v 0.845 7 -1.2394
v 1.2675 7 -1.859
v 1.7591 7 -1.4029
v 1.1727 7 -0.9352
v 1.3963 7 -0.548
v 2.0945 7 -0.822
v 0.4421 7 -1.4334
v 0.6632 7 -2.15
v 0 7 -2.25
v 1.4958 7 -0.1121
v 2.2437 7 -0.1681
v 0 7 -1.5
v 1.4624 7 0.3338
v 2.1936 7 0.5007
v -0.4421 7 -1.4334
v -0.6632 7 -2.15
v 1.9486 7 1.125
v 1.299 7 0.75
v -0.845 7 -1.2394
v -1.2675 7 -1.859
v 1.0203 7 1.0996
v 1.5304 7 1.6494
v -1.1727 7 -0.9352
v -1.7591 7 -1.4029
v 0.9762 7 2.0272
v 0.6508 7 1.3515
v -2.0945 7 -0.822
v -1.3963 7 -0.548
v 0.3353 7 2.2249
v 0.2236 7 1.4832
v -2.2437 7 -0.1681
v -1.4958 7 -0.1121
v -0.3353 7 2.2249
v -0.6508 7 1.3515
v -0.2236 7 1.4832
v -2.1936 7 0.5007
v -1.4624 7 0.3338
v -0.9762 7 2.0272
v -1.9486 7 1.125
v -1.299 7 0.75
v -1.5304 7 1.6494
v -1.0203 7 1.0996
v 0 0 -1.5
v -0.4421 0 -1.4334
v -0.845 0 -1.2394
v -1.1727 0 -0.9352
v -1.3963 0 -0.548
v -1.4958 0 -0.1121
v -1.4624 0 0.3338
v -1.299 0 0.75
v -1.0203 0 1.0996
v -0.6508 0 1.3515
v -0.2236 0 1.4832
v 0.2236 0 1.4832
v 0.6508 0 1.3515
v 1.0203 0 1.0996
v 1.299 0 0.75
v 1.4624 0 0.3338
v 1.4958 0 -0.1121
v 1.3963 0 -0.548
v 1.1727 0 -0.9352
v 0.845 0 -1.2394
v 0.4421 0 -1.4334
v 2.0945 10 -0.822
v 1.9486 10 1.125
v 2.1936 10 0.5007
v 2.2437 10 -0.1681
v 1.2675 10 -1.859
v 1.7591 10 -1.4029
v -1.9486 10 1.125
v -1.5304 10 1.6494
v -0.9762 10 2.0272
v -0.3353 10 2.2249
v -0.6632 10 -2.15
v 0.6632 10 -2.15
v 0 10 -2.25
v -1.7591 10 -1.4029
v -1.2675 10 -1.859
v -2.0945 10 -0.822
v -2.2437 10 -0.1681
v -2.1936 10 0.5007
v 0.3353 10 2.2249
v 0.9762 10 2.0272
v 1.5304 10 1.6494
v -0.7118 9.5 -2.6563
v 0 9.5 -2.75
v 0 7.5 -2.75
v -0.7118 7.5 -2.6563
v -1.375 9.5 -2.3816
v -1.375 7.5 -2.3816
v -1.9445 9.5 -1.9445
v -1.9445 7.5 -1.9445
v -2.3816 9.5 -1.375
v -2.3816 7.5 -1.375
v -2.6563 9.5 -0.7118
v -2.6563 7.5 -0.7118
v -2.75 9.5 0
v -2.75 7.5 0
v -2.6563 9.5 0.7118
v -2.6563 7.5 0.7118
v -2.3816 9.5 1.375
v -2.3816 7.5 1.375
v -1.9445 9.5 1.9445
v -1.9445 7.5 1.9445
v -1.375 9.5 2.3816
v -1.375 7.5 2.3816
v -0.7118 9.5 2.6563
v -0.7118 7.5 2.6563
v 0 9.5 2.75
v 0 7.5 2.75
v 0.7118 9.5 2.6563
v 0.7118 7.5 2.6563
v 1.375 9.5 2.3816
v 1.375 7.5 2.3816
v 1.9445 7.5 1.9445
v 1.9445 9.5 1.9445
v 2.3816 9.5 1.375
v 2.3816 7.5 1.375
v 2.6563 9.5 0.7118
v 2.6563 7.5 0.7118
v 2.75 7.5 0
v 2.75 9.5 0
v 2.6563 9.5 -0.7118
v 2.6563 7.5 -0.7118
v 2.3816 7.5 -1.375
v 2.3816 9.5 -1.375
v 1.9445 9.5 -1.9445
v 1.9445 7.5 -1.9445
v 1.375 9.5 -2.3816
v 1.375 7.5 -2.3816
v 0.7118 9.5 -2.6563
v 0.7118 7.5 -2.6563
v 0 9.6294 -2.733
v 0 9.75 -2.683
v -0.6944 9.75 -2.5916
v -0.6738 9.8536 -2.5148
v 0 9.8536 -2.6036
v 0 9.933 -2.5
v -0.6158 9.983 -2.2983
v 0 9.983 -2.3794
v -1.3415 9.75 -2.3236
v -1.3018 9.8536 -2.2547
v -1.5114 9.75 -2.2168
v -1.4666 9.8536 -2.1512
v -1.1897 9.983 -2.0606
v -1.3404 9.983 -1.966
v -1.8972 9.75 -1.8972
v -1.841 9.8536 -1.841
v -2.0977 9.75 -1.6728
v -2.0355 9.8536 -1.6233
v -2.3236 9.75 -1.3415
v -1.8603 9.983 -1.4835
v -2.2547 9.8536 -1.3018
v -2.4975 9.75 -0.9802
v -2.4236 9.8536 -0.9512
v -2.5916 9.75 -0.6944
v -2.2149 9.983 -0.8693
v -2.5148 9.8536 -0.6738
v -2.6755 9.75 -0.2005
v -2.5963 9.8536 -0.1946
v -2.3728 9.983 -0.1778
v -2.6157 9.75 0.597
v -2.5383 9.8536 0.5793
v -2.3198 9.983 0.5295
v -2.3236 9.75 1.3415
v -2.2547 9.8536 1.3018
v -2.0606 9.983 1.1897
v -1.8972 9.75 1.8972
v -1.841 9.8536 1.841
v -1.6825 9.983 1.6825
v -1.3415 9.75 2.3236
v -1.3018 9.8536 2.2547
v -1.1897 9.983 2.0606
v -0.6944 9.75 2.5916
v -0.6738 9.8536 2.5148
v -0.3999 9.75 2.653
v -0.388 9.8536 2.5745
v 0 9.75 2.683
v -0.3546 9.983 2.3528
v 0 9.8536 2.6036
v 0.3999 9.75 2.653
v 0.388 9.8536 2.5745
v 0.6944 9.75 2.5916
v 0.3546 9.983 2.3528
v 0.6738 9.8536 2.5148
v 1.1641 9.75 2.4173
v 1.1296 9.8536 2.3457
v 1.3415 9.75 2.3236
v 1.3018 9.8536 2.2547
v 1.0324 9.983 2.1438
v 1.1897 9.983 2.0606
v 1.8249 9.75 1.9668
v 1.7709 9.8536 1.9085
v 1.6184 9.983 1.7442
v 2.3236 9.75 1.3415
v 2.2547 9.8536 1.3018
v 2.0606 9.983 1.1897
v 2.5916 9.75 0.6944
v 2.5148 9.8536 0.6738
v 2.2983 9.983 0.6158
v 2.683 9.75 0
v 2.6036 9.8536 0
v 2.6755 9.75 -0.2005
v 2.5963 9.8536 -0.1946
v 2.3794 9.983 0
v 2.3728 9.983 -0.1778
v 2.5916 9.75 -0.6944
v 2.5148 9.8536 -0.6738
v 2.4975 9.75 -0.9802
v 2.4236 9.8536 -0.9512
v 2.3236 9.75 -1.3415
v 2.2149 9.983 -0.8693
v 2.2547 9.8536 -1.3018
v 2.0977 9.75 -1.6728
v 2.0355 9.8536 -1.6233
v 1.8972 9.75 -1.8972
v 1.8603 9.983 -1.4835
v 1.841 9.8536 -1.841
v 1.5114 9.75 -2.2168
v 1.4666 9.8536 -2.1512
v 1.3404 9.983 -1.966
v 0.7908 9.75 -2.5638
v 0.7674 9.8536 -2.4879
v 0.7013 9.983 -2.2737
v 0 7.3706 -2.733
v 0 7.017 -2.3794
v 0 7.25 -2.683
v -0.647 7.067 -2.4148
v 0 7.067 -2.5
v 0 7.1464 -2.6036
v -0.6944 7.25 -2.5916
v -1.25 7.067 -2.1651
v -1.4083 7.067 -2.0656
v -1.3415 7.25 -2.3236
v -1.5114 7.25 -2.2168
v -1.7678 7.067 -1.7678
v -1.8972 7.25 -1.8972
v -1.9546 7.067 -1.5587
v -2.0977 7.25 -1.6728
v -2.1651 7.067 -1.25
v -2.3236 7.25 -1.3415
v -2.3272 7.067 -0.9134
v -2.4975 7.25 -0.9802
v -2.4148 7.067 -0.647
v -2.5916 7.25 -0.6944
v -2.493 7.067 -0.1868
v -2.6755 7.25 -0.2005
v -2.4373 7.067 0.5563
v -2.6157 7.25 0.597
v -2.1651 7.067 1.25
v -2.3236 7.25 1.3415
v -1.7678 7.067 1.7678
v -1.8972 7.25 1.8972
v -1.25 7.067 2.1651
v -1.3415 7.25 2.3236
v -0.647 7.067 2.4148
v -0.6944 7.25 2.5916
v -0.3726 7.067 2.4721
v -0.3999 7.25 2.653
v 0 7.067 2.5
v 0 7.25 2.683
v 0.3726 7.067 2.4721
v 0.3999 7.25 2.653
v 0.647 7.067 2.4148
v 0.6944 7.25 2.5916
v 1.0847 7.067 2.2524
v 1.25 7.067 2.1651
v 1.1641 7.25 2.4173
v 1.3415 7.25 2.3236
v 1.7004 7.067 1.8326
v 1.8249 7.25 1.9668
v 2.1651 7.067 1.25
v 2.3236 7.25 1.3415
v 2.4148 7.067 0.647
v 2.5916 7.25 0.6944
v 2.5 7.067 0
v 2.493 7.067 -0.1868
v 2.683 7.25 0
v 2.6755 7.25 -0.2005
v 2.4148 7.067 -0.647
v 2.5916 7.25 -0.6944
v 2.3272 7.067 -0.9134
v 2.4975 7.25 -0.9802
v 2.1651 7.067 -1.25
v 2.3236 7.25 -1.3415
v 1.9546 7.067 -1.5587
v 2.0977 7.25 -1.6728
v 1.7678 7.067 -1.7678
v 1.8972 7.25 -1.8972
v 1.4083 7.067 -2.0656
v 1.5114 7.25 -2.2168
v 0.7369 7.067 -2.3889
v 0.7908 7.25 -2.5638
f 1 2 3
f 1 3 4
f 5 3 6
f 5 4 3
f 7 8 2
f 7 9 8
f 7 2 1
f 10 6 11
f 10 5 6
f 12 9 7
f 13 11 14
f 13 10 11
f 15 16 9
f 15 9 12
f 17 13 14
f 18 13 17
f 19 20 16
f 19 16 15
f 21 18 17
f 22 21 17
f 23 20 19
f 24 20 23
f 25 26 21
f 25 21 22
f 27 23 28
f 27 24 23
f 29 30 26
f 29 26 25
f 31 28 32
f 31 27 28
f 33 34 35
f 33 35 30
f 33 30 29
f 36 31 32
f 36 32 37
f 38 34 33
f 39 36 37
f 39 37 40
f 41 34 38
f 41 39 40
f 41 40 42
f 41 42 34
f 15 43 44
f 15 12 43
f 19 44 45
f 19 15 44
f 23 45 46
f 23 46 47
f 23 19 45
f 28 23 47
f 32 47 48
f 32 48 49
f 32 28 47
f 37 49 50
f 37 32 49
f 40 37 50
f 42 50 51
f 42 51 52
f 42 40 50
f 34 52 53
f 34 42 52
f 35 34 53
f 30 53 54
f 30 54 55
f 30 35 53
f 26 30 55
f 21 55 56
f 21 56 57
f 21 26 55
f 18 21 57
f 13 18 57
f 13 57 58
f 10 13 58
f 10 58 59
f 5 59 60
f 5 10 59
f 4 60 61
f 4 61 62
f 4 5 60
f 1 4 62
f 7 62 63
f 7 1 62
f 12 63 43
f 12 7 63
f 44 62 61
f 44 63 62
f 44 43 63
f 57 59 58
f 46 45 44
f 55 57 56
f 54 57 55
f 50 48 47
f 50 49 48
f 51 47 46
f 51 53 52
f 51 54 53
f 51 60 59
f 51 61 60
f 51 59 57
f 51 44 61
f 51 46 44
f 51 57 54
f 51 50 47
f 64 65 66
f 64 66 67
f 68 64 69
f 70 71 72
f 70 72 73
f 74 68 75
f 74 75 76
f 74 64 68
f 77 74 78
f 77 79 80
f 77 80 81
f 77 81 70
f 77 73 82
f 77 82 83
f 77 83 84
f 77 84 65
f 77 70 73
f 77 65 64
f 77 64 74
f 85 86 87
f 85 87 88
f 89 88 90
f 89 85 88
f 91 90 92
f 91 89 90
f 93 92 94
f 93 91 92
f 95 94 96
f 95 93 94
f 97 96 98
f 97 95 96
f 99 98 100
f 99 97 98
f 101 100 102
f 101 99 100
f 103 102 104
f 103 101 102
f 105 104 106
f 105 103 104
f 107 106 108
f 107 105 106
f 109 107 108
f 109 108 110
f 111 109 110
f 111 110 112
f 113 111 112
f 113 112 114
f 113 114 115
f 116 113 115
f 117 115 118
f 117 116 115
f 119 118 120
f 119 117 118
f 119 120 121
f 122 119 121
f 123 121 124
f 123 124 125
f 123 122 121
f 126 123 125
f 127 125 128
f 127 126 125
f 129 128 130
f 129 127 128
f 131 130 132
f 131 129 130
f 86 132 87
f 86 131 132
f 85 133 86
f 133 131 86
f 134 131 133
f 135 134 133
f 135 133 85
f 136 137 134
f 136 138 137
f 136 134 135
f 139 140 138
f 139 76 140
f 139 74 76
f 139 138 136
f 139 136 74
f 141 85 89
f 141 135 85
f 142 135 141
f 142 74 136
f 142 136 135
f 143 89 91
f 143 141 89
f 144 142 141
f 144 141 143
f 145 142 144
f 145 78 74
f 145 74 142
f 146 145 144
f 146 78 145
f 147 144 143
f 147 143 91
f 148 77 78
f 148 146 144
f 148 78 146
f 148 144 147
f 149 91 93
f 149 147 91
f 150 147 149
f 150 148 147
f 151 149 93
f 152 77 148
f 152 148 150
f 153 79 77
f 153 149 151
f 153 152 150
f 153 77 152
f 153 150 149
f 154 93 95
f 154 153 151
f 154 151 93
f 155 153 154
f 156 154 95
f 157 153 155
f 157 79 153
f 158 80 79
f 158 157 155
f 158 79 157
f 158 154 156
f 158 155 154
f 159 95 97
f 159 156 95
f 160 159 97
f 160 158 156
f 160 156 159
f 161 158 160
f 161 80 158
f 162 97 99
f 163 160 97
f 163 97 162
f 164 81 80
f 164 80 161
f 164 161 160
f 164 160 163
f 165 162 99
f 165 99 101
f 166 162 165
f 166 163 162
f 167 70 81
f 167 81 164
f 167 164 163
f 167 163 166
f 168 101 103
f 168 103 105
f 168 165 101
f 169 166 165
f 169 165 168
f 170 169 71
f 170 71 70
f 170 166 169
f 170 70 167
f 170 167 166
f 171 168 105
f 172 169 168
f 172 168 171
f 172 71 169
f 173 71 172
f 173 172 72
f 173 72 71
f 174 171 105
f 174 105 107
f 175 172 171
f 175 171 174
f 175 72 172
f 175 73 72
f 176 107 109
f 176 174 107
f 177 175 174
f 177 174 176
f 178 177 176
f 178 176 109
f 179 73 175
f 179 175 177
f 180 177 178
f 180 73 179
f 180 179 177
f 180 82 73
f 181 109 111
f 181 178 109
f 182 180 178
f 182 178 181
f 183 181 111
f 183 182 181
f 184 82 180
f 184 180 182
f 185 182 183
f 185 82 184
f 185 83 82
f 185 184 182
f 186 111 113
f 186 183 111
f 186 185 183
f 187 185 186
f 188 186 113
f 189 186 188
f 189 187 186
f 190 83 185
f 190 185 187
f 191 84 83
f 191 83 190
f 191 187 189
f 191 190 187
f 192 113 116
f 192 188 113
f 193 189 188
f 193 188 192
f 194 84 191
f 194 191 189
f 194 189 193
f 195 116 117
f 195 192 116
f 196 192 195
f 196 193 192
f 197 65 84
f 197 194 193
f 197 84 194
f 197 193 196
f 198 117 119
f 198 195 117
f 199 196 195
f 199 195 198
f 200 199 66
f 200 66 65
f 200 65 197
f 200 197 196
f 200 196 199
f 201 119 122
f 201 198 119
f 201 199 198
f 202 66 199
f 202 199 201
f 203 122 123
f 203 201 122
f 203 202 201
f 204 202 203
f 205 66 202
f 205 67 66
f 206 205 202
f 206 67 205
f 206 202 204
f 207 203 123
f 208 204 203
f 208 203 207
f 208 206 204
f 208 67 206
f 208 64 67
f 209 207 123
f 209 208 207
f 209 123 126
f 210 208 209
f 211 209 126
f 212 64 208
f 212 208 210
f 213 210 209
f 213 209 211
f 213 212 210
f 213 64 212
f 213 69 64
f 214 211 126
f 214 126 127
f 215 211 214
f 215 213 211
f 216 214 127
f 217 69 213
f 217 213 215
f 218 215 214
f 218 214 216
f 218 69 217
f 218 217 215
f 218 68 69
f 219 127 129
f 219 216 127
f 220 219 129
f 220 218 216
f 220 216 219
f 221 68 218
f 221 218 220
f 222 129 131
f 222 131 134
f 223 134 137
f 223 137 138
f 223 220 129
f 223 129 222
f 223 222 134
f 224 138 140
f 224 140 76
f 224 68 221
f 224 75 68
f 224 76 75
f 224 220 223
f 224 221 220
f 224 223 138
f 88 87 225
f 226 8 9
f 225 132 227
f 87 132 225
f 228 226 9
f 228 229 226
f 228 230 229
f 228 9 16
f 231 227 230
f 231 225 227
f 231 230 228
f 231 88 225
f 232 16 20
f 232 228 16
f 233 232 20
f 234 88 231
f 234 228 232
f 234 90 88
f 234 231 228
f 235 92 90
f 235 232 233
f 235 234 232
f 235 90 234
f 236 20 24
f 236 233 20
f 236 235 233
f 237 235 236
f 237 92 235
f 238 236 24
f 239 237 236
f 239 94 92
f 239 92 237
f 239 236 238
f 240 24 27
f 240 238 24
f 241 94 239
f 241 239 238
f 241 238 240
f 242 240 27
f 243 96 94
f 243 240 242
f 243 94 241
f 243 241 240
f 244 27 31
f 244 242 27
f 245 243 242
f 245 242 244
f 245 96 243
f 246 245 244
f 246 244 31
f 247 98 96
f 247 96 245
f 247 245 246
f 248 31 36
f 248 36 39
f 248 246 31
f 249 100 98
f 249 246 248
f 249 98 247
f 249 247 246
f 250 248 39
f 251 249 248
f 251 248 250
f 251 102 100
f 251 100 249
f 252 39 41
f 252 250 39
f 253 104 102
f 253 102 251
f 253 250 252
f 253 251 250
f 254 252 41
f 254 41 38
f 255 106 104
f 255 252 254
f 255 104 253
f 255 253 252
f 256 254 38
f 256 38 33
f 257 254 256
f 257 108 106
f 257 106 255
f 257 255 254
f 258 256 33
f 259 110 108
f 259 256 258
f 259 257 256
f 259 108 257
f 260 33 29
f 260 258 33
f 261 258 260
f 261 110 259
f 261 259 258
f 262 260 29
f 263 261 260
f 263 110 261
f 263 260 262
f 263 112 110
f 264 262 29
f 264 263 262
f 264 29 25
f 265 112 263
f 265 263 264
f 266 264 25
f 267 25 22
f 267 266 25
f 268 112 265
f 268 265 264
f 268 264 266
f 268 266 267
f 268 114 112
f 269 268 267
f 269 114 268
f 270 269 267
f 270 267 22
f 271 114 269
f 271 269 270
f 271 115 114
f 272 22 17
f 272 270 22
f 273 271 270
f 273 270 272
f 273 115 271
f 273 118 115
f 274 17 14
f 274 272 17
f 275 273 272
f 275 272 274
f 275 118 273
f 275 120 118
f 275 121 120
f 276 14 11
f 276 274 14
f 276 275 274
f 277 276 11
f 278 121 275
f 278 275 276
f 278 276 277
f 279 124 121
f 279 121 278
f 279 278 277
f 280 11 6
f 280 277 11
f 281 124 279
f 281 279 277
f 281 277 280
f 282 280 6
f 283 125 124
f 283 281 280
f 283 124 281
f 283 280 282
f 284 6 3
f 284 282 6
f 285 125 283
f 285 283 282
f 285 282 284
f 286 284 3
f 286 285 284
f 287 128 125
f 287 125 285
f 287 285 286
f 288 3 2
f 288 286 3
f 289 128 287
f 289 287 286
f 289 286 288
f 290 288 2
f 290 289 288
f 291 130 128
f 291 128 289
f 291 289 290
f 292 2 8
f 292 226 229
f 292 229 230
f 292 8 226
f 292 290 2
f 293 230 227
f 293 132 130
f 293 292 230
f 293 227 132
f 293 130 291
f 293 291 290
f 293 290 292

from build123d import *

# Parameters (mm, degrees)
FILLET1_R = 0.5


with BuildPart() as part:
    # Sketch1 → Revolve1 (revolve)
    with BuildSketch(Plane.XY, mode=Mode.PRIVATE) as revolve1_sk:
        Polygon((0, 0), (1.5, 0), (1.5, 7), (2.75, 7), (2.75, 10), (0, 10), (0, 7), align=None)
    revolve(revolve1_sk.sketch.rotate(Axis((0, 0, 0), (0, 1, 0)), 90), axis=Axis((0, 0, 0), (0, 1, 0)))

    # Fillet1
    fillet1_edges = [part.edges().sort_by_distance(p)[0] for p in [
        (0, 7, 2.75),
        (0, 10, 2.75),
    ]]
    fillet(fillet1_edges, radius=FILLET1_R)


solid = part.part
